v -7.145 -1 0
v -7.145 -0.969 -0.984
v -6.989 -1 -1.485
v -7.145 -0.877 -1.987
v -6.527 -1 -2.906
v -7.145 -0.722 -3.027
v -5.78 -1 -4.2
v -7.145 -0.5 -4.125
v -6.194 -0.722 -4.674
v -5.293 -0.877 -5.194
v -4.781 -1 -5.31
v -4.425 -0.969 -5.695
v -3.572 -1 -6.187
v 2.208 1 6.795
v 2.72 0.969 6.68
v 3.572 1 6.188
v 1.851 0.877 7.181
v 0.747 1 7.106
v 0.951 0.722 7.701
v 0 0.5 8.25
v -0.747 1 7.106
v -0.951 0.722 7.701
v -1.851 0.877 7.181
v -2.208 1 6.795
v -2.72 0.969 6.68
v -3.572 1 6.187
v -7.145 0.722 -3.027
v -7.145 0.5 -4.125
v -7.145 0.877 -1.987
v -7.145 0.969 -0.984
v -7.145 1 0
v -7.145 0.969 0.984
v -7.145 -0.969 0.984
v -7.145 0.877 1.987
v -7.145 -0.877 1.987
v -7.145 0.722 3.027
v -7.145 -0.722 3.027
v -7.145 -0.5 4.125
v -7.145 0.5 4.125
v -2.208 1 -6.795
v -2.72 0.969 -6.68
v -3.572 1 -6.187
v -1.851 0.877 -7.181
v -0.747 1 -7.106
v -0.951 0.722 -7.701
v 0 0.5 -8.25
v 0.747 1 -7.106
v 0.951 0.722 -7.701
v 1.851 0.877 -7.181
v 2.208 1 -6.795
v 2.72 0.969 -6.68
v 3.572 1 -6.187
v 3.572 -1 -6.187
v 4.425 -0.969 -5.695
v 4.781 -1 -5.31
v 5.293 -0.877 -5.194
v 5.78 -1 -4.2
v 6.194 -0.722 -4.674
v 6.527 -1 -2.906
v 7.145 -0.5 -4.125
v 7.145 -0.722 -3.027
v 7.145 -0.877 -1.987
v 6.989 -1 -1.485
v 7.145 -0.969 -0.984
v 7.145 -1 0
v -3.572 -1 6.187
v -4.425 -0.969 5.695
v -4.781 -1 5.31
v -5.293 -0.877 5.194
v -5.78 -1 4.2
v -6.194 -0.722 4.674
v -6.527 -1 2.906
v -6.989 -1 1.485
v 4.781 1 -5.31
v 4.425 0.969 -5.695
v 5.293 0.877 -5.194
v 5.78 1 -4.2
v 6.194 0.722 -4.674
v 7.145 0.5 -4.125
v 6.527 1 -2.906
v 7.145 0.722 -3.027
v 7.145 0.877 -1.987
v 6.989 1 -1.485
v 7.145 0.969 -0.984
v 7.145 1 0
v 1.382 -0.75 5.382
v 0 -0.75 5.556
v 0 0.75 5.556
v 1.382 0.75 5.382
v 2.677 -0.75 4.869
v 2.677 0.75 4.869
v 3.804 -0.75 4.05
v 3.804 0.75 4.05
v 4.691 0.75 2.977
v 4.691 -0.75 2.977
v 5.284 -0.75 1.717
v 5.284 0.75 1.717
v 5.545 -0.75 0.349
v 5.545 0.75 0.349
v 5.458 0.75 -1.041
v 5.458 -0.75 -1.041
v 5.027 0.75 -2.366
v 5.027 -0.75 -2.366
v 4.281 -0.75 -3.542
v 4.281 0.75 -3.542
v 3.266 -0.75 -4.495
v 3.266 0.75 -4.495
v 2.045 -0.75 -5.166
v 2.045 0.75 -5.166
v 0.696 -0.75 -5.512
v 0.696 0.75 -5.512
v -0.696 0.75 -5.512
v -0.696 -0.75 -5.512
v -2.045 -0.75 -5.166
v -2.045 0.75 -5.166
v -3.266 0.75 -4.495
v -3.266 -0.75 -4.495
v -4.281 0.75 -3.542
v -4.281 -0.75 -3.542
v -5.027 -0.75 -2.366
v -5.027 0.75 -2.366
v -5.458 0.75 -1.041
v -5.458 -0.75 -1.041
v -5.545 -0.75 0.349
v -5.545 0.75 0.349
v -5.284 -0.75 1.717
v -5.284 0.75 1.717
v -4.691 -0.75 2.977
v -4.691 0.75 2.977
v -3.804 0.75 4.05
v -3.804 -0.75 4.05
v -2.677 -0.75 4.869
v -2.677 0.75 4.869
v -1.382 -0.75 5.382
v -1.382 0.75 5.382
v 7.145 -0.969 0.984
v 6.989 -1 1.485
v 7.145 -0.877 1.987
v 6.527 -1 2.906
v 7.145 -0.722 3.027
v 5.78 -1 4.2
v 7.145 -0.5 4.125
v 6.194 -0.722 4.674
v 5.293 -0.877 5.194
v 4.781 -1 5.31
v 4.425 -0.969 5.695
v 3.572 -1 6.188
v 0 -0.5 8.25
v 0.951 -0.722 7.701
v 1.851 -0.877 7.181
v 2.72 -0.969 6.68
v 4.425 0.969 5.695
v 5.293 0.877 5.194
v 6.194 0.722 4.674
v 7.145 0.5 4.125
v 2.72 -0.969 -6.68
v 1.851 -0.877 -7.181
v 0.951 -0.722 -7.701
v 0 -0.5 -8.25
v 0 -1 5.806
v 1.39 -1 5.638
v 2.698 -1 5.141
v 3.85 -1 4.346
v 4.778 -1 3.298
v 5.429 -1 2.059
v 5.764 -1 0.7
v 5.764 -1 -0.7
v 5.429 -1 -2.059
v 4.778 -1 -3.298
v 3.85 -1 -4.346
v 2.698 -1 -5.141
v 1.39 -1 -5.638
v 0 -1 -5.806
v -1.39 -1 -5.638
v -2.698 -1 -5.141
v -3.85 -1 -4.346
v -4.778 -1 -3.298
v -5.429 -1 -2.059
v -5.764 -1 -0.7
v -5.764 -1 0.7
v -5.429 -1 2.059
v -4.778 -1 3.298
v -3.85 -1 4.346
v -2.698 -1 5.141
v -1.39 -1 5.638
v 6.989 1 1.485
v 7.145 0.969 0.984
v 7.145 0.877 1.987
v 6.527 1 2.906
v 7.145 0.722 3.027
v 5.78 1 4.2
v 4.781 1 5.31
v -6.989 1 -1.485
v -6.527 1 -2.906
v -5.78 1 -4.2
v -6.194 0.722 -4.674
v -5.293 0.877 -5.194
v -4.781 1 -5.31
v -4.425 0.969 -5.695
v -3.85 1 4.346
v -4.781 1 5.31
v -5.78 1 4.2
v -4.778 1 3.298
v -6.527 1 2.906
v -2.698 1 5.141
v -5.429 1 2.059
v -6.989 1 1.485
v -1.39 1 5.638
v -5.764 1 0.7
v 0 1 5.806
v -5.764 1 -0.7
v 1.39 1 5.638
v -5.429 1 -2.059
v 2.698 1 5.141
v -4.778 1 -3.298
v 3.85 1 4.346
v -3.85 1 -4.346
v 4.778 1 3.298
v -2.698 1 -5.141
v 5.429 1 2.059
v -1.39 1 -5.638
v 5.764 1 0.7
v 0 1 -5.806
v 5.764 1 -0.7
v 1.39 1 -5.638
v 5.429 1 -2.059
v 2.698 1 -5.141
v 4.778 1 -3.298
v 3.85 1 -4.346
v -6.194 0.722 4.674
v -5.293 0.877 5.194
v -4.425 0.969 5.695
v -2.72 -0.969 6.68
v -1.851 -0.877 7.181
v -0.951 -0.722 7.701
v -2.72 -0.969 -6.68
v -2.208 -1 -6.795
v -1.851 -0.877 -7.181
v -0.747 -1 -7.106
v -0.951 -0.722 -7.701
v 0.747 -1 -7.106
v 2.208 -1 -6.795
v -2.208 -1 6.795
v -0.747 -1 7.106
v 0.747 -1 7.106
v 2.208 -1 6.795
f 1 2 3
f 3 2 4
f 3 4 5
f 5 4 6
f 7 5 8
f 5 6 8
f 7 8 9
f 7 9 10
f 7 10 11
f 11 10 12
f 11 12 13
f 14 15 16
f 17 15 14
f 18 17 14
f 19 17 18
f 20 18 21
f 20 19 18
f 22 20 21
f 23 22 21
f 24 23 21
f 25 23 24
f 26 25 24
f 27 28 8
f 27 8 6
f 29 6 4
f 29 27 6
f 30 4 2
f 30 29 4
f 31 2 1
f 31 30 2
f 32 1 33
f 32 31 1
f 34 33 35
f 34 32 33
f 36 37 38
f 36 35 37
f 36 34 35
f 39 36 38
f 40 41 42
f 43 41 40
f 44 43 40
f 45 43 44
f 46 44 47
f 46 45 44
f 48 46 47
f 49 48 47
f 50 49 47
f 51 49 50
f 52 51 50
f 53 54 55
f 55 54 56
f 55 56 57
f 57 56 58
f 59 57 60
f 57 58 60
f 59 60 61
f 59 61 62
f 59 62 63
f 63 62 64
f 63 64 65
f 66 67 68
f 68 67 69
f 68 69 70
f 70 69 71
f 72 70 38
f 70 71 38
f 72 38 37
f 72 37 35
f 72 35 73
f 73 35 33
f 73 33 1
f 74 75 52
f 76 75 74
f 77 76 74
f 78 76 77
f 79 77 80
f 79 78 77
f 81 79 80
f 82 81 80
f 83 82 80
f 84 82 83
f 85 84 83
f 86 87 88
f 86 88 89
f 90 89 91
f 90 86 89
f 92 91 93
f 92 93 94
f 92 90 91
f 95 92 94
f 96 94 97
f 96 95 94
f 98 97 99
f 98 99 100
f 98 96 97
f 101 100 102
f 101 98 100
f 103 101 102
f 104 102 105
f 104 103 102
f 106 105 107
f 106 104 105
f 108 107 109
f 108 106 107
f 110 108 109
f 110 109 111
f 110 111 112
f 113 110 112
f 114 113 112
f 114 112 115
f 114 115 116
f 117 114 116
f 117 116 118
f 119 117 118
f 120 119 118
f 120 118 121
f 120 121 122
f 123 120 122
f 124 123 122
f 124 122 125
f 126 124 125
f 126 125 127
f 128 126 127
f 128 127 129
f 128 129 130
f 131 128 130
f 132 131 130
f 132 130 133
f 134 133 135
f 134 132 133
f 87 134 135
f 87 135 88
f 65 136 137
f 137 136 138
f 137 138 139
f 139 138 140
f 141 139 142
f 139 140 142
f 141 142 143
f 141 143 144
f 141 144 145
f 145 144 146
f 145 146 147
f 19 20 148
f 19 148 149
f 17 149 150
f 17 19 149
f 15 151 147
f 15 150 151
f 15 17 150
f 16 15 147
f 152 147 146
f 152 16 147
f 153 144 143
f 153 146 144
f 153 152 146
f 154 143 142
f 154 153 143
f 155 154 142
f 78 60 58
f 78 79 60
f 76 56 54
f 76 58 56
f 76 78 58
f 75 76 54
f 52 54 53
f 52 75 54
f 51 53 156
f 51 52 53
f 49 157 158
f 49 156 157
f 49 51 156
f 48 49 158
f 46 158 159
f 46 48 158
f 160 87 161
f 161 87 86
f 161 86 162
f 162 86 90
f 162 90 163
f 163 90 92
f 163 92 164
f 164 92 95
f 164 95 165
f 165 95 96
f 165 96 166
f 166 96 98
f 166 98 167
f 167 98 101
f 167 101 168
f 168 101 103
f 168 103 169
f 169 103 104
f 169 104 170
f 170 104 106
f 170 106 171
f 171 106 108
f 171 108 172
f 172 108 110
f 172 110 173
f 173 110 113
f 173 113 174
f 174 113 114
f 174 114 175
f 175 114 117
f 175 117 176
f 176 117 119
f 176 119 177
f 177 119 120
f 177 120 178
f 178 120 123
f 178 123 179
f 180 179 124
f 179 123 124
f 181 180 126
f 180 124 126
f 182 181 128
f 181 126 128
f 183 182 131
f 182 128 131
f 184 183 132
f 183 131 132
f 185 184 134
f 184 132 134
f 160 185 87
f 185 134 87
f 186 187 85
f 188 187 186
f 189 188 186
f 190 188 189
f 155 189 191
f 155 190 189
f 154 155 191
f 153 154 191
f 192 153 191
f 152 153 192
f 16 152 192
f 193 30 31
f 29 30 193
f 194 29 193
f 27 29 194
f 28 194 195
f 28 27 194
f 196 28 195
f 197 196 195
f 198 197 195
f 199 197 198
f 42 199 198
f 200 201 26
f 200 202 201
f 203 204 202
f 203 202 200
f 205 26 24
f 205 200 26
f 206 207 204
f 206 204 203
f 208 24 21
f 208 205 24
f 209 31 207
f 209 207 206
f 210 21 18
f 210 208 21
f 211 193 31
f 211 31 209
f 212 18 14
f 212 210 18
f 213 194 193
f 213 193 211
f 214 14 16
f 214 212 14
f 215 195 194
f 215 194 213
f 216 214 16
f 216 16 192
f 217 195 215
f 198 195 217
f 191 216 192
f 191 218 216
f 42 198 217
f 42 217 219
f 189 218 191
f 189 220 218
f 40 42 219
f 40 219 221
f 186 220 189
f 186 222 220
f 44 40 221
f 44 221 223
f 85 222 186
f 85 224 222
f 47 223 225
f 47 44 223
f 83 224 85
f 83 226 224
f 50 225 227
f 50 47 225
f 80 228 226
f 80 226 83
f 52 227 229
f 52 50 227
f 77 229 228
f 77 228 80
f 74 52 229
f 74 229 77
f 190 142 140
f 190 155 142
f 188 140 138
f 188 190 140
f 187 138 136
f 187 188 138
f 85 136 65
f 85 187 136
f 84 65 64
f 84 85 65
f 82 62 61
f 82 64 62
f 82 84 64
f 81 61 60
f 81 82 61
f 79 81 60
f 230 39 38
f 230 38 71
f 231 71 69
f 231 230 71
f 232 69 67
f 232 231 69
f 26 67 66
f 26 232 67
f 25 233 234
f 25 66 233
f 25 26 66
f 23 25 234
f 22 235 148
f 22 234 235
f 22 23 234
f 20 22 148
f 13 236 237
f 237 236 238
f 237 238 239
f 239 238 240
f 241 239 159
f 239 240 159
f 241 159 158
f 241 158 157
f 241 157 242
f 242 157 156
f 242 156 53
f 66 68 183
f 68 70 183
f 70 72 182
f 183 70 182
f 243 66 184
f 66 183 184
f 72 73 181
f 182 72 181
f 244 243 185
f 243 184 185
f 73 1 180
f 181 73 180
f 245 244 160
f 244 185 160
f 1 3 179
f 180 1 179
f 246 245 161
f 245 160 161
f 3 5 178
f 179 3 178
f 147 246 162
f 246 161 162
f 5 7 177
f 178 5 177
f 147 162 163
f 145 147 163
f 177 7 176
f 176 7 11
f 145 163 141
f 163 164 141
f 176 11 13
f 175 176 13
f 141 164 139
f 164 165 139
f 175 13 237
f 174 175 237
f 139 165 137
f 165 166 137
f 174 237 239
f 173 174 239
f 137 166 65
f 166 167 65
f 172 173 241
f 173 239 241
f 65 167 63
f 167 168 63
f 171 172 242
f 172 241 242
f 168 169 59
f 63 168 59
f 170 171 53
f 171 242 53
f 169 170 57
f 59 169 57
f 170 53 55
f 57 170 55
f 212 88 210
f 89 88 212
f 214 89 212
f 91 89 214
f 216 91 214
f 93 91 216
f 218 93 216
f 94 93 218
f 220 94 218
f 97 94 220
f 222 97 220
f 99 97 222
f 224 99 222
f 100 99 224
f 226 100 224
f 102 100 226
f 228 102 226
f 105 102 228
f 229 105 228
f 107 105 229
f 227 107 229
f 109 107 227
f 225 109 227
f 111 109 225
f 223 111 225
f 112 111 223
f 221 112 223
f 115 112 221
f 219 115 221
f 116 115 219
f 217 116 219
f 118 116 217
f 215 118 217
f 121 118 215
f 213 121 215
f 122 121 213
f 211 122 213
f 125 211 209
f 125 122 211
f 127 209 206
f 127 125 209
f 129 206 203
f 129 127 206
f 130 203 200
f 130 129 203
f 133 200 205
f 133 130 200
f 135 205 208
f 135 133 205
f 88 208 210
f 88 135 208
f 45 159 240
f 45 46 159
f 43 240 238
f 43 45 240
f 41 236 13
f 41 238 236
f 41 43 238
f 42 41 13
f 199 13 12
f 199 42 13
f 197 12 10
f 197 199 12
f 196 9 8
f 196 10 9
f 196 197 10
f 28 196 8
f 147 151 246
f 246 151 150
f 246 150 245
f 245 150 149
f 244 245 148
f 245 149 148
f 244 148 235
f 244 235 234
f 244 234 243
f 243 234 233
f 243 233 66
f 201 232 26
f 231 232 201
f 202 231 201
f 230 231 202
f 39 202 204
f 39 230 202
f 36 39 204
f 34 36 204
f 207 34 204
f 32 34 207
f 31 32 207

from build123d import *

# Parameters (mm, degrees)
SKETCH1_R           = 5.55625
BOSS_EXTRUDE1_DEPTH = 1
CHAMFER1_SIZE       = 0.25


with BuildPart() as part:
    # Sketch1 → Boss-Extrude1 (new, symmetric)
    with BuildSketch(Plane(origin=(0, 0, 0), x_dir=(1, 0, 0), z_dir=(0, 1, 0))):
        Polygon((0, 8.25), (-7.144709581, 4.125), (-7.144709581, -4.125), (0, -8.25), (7.144709581, -4.125), (7.144709581, 4.125), align=None)
        with Locations(Location((0, 0, 0), (0, 0, 270))):
            Circle(SKETCH1_R, mode=Mode.SUBTRACT)
    extrude(amount=BOSS_EXTRUDE1_DEPTH, both=True)

    # Sketch4 → Cut-Revolve1 (revolve, cut)
    with BuildSketch(Plane.XY):
        Polygon((-7.144709581, 1), (-8.25, 0.5), (-8.644709581, 0.5), (-8.644709581, 2), (-7.144709581, 2), align=None)
        Polygon((-7.144709581, -2), (-7.144709581, -1), (-8.25, -0.5), (-8.644709581, -0.5), (-8.644709581, -2), align=None)
    revolve(axis=Axis((0, 1, 0), (0, -1, 0)), mode=Mode.SUBTRACT)

    # Chamfer1
    chamfer1_edges = [part.edges().sort_by_distance(p)[0] for p in [
        (0, -1, -5.55625),
        (0, 1, -5.55625),
    ]]
    chamfer(chamfer1_edges, length=CHAMFER1_SIZE)


solid = part.part
